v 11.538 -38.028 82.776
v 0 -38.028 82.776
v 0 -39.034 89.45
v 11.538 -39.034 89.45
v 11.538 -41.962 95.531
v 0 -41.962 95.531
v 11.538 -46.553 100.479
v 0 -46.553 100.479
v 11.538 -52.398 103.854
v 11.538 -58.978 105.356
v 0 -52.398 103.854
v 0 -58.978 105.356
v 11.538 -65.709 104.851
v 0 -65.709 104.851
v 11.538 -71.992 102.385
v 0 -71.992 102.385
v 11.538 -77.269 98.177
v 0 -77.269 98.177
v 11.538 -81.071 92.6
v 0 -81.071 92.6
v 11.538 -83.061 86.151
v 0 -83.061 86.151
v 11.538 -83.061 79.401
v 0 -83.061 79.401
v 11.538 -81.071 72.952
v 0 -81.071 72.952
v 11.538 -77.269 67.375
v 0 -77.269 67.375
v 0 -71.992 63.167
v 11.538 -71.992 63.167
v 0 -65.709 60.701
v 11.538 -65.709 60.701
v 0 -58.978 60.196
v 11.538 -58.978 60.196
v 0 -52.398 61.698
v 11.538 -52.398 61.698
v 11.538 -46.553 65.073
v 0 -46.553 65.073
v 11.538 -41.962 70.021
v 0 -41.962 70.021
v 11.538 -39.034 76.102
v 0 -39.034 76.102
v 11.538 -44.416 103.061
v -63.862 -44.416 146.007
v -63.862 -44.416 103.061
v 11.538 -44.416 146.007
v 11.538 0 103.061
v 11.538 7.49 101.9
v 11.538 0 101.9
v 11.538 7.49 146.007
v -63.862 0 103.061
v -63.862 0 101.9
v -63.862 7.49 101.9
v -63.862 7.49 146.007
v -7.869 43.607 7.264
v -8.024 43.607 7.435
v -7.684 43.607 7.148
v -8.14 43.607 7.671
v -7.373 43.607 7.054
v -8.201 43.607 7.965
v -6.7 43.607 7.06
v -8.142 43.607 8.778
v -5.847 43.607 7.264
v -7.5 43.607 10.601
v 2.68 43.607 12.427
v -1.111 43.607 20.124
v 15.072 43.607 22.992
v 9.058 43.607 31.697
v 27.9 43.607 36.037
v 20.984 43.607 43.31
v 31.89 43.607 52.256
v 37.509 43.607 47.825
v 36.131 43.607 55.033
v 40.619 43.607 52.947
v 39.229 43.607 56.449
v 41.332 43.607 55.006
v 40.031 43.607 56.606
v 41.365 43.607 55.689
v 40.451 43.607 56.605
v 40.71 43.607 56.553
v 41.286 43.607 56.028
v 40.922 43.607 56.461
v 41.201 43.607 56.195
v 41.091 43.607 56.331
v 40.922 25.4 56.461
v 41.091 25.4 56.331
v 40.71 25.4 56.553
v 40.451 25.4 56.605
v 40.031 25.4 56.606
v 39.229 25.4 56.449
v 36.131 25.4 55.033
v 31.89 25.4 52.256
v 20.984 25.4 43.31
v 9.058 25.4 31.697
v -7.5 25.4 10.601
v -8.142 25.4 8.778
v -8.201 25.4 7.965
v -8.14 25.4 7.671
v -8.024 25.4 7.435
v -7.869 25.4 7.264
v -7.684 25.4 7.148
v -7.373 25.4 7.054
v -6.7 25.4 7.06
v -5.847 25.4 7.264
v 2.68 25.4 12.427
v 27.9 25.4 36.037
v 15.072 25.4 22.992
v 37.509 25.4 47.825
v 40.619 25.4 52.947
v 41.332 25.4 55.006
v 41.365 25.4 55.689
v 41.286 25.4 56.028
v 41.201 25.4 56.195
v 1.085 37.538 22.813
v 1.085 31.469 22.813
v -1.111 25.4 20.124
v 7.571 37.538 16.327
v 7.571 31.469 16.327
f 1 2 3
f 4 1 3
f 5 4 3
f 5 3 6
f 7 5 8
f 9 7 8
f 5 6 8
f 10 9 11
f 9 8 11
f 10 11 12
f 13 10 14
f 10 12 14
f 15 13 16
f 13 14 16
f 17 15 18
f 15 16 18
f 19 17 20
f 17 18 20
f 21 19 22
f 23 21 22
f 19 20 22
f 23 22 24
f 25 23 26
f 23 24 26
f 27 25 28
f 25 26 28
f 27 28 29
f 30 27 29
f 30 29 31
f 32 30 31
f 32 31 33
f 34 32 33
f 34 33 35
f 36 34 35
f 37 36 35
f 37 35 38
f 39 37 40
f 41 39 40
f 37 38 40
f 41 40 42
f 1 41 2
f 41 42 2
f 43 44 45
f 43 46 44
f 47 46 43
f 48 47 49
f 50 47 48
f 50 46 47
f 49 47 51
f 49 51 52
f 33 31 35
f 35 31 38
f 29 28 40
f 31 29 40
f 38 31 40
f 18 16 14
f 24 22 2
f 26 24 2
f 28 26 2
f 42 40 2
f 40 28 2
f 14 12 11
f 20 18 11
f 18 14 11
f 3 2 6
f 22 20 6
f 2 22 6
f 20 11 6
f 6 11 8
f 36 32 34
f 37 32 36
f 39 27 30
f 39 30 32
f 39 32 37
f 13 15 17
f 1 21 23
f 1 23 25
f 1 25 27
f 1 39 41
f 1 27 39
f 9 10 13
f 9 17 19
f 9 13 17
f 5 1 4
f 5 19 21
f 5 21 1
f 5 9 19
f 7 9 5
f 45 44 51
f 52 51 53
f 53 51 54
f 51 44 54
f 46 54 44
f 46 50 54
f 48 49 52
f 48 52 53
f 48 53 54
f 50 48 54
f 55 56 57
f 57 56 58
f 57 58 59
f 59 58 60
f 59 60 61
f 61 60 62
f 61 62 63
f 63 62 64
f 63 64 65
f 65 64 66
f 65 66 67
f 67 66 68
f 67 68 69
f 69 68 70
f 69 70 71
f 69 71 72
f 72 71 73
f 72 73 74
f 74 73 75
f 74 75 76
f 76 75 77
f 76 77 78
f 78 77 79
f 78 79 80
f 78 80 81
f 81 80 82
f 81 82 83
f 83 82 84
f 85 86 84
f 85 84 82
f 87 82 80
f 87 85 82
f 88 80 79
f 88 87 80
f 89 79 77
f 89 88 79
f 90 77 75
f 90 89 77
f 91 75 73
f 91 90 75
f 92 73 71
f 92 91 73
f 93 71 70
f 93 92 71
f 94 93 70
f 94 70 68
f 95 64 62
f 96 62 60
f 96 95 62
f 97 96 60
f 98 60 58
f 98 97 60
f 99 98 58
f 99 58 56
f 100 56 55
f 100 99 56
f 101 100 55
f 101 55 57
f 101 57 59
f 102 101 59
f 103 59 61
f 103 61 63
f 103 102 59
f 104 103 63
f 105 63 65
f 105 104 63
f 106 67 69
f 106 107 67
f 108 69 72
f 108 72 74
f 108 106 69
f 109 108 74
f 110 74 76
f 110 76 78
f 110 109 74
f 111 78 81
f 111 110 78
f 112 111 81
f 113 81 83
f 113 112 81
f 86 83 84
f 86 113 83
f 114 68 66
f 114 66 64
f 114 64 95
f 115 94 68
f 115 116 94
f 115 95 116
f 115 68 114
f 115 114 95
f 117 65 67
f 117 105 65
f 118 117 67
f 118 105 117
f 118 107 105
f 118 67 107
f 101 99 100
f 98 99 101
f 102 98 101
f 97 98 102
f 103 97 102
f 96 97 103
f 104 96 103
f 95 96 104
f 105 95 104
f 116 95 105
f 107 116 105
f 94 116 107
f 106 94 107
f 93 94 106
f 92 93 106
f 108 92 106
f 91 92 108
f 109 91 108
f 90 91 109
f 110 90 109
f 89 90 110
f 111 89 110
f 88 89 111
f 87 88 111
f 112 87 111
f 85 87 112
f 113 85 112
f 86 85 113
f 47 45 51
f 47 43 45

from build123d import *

# Parameters (mm, degrees)
F0_R     = 22.6430221655
F1_DEPTH = 11.537740007
F4_DEPTH = 25.4
F5_DEPTH = 50
F7_START = -25.399999693
F7_DEPTH = 18.2073842734


with BuildPart() as f1:
    # F0 (on Right) → F1 (new body)
    with BuildSketch(Plane.YZ):
        with Locations((-60.6705956161, 82.7760472894)):
            Circle(F0_R)
    extrude(amount=F1_DEPTH)


with BuildPart() as f4:
    # F3 (on face) → F4 (new body)
    with BuildSketch(Plane.YZ.offset(11.537740007)):
        Polygon((-44.416218996, 103.0612364411), (0, 103.0612364411), (0, 101.899959147), (7.4902996421, 101.899959147), (7.4902996421, 146.0065096617), (-44.416218996, 146.0065096617), align=None)
    extrude(amount=-F4_DEPTH)

    # F5 (add): a face of the model
    f5_faces = [f4.faces().sort_by_distance(p)[0] for p in [
        (-13.862259993, -18.3766383548, 124.4481535588),
    ]]
    extrude(f5_faces, amount=F5_DEPTH)


with BuildPart() as f7:
    # F6 (on Front) → F7 (new body)
    with BuildSketch(Plane.XZ.offset(F7_START)):
        with BuildLine():
            add(Edge.make_bspline(
                [(41.0911589861, 56.3310682774), (34.6054481336, 62.8171064385), (1.0852594857, 22.8128984783), (-32.4349291623, -17.1913094819), (7.5709703382, 16.3268603172), (47.5768698386, 49.8450301162), (41.0911589861, 56.3310682774)],
                knots=[0, 0, 0, 2.0943951024, 2.0943951024, 4.1887902048, 4.1887902048, 6.2831853072, 6.2831853072, 6.2831853072], degree=2, weights=[1, 0.5, 1, 0.5, 1, 0.5, 1]))
        make_face()
    extrude(amount=-F7_DEPTH)


solid = Compound([f1.part, f4.part, f7.part])
